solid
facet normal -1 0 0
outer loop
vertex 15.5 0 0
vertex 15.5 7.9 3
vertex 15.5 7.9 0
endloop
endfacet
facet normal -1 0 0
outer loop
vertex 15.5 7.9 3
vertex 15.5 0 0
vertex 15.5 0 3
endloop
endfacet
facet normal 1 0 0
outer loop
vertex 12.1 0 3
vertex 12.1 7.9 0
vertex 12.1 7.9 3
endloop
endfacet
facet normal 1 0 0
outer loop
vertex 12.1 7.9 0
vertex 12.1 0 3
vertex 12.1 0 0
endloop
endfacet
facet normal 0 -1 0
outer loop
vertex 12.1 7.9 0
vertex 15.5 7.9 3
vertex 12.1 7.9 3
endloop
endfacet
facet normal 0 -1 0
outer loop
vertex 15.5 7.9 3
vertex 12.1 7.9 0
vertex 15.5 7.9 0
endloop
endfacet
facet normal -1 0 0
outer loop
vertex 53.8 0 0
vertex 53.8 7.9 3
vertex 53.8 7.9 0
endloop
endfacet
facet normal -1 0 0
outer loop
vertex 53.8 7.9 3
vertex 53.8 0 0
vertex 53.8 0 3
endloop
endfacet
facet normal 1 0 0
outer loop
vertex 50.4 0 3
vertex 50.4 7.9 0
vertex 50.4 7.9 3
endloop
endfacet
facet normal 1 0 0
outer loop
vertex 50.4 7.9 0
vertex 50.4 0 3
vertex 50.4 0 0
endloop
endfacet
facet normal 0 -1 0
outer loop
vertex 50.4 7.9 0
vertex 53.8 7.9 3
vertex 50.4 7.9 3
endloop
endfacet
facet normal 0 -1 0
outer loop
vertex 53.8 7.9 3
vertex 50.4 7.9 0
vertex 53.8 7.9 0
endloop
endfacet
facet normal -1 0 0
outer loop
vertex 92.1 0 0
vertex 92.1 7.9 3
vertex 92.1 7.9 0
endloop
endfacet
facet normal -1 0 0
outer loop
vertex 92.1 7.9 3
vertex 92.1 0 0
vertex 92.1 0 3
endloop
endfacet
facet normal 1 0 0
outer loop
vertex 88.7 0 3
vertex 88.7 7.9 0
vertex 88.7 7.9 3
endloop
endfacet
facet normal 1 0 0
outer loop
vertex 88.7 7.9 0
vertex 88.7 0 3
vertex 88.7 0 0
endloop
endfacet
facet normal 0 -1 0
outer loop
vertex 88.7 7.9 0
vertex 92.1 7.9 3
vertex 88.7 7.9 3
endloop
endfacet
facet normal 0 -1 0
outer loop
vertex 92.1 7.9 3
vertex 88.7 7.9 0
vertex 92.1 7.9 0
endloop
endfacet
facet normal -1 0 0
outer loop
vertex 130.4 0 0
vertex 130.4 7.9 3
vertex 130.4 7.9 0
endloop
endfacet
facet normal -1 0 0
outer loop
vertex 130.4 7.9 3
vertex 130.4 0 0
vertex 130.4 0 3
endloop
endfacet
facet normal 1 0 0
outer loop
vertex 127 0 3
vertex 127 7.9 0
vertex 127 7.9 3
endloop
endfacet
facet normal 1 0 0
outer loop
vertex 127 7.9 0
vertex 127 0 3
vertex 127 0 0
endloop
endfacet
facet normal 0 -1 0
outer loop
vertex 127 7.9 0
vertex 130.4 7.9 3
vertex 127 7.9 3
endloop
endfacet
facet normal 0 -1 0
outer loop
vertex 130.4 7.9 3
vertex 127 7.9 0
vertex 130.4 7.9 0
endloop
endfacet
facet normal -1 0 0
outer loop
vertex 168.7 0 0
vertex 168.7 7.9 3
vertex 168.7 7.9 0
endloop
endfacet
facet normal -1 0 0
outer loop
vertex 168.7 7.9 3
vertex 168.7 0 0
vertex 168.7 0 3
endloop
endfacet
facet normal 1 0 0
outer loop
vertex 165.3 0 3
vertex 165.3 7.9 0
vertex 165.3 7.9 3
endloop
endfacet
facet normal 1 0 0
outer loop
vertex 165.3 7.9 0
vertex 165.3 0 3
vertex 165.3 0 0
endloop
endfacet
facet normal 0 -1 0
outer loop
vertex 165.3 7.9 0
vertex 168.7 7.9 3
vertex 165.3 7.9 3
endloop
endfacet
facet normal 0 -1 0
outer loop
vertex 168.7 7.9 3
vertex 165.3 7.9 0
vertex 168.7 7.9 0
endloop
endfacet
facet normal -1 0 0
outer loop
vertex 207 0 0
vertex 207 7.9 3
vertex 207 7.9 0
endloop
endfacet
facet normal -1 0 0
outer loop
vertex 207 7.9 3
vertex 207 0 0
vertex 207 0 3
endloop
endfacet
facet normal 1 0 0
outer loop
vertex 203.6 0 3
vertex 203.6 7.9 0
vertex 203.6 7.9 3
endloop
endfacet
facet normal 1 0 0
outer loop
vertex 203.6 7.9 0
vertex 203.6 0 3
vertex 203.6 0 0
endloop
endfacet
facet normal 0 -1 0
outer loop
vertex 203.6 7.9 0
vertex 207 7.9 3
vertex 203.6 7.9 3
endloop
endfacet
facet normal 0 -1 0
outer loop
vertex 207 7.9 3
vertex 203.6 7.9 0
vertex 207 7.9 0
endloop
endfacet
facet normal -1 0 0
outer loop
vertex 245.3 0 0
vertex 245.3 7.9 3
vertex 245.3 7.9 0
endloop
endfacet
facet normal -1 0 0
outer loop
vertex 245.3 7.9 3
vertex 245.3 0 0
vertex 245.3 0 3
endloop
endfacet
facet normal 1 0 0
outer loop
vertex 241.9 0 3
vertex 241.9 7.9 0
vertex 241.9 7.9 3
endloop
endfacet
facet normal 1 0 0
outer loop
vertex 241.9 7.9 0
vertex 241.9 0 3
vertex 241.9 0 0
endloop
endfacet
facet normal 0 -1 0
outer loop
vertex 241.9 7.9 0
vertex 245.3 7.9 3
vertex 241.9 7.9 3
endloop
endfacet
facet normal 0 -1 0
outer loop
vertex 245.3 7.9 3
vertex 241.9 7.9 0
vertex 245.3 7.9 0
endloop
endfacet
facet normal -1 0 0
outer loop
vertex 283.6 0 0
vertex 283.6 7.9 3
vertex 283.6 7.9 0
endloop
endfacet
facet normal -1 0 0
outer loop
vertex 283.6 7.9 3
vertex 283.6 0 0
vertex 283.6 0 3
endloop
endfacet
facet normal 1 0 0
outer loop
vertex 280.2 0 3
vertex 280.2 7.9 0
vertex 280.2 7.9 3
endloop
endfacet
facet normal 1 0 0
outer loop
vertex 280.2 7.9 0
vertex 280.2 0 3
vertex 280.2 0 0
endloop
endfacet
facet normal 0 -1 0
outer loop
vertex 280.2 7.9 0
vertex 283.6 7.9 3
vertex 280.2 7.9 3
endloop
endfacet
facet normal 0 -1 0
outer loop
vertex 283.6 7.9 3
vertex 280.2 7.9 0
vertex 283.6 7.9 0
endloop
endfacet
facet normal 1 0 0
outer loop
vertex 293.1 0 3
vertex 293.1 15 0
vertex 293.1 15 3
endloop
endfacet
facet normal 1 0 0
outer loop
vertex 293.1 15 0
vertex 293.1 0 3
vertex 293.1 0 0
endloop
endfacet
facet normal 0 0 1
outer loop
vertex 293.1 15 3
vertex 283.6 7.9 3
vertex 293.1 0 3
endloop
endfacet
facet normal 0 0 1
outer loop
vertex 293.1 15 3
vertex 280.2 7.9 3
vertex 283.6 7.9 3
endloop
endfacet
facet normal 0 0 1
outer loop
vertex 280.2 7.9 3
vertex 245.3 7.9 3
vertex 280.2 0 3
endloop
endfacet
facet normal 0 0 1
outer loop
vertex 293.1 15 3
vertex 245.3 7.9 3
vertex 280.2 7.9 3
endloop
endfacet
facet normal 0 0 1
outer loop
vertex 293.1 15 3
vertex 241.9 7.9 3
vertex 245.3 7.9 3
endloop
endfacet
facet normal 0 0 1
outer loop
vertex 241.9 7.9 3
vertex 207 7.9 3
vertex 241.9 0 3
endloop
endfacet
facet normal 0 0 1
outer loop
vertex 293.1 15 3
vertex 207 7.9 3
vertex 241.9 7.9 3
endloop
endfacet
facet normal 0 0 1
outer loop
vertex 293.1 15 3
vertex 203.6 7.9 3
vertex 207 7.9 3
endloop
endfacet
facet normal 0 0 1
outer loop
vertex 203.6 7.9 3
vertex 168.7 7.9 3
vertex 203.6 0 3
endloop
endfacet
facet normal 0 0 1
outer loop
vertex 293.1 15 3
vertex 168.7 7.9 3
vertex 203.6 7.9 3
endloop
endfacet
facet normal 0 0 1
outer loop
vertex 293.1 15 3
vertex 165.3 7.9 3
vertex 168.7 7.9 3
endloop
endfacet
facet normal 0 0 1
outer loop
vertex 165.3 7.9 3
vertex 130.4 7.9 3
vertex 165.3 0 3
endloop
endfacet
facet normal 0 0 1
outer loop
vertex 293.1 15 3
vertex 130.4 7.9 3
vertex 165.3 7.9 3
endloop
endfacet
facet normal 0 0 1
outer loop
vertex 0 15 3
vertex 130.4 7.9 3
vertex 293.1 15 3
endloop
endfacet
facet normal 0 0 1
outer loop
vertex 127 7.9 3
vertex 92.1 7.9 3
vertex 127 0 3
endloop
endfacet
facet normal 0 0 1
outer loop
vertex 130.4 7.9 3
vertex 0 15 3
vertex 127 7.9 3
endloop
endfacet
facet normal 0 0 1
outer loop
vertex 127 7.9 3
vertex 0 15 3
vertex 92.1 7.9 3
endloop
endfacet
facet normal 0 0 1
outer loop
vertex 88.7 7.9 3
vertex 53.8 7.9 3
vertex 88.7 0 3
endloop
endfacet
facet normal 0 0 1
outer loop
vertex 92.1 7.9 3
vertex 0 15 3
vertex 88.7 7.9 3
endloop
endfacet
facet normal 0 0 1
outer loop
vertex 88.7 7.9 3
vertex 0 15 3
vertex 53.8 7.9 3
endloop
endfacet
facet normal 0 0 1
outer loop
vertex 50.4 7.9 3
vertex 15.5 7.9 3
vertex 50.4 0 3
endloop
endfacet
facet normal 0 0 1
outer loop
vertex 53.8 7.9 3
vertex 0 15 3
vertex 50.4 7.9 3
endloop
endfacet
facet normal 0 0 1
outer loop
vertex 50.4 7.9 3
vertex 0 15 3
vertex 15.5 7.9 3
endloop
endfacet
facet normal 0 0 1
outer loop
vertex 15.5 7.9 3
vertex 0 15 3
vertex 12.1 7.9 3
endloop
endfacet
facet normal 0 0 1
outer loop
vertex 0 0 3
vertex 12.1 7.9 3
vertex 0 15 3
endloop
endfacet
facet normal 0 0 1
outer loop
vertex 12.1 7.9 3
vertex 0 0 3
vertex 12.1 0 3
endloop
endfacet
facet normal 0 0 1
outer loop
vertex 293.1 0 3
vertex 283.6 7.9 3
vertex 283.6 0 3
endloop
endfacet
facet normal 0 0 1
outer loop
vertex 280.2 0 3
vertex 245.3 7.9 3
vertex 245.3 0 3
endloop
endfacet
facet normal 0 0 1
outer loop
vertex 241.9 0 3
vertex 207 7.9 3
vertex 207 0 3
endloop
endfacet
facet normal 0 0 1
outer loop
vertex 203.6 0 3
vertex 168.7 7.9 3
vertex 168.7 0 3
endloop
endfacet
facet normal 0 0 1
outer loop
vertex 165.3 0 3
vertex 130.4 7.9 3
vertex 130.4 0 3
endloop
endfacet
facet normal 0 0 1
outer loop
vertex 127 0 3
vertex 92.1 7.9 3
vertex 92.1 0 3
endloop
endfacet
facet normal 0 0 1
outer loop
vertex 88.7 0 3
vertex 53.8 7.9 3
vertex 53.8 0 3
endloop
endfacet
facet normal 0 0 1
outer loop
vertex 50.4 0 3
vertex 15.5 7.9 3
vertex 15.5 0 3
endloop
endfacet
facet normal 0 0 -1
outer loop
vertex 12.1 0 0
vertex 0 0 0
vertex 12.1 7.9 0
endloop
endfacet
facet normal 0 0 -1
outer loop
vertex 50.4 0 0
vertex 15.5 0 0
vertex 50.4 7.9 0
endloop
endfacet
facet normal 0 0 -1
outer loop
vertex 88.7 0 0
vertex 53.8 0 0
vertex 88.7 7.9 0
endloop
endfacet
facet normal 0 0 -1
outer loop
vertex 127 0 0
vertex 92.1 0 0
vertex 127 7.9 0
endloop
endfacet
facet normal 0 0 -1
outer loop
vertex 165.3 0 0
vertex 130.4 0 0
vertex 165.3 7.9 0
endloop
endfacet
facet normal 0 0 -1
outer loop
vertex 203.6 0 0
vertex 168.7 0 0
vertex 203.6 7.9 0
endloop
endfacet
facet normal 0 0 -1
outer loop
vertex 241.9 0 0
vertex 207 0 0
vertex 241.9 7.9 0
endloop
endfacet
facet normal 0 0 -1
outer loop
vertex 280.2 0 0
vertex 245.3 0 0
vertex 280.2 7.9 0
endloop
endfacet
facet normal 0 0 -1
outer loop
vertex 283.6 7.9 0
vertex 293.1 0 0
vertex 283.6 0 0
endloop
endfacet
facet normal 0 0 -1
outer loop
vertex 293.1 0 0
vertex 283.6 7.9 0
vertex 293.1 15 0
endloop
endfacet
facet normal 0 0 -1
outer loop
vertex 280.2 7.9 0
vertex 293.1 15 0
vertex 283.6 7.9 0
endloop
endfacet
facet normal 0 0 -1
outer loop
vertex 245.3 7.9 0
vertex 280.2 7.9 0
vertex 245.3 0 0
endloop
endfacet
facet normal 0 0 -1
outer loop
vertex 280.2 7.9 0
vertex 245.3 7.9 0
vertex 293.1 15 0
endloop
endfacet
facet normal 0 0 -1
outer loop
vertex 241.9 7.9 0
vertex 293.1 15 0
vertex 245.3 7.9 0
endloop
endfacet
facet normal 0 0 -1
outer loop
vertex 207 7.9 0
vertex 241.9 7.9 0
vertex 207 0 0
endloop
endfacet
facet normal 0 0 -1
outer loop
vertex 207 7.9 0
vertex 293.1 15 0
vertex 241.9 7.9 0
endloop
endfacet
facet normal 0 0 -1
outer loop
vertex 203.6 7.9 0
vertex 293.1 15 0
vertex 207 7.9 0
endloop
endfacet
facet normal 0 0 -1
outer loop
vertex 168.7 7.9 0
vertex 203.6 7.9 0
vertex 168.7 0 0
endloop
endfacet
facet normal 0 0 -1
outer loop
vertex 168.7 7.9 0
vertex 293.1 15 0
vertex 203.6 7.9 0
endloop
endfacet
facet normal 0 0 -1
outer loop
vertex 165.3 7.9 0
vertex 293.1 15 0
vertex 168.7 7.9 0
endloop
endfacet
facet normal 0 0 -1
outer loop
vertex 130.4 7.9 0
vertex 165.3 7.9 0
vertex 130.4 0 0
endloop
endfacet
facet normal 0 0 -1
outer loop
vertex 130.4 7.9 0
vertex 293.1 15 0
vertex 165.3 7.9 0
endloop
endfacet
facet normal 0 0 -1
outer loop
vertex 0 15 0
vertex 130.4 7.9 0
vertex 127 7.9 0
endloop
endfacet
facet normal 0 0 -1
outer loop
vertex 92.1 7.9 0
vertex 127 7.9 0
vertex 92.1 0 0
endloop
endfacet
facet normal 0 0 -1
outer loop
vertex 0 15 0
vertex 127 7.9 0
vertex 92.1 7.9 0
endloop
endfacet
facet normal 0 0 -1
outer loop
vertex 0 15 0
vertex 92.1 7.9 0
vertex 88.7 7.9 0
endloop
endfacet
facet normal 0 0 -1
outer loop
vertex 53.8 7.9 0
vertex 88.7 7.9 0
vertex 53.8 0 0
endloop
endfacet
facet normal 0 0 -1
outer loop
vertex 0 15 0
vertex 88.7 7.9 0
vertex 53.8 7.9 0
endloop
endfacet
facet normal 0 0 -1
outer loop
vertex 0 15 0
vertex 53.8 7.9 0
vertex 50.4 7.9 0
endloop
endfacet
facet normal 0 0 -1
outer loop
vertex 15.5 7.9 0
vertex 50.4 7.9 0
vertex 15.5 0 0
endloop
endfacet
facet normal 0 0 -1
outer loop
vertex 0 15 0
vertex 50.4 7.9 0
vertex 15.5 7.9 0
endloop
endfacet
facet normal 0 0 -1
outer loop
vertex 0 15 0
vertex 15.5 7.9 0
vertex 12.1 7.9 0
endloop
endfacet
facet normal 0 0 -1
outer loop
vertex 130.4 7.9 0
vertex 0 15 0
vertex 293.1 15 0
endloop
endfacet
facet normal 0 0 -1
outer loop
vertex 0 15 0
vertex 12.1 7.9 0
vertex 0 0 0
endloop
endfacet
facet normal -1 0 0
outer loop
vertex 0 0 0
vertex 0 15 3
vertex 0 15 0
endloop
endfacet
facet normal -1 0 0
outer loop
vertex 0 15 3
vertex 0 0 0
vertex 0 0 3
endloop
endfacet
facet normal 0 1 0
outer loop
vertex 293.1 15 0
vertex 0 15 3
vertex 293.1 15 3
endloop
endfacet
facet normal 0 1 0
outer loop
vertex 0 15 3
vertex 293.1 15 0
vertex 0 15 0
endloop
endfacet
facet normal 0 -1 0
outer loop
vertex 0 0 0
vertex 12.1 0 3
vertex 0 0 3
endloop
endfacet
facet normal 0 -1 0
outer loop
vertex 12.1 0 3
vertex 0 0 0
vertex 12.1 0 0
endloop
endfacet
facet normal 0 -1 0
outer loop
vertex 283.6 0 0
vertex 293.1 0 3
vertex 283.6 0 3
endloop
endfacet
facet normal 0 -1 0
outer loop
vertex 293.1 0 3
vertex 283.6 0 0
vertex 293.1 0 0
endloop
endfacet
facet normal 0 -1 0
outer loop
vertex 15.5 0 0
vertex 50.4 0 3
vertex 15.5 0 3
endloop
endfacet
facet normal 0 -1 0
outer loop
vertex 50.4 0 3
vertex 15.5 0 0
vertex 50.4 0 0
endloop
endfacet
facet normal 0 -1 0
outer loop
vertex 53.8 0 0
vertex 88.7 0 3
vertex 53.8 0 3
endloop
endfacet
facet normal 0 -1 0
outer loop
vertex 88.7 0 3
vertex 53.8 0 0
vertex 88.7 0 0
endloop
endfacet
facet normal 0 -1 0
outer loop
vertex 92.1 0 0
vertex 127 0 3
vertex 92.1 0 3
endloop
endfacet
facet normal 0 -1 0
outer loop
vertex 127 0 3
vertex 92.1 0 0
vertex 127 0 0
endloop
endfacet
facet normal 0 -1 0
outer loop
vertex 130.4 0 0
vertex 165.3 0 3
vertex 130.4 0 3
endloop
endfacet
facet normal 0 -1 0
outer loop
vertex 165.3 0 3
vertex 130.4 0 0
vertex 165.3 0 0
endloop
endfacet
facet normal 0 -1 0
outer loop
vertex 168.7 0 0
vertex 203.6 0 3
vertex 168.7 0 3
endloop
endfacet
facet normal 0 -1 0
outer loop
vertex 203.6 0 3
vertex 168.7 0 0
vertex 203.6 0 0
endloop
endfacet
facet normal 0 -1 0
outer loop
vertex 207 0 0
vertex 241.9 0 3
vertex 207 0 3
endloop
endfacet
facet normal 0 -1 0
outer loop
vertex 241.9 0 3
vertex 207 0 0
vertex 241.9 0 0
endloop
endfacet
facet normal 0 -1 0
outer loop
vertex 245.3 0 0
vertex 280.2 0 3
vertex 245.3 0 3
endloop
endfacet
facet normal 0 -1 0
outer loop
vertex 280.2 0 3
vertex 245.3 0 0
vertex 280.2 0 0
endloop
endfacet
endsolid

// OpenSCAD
// file: parametre.scad
/* pour le rendu openscad */

// pour la finesse de rendu
// plus c'est élevé, mieux c'est... mais ça prend plus de temps et de ressource
resolution = 10;

// pour export DXF
show_mode_projection = 0;

// pour enlever de la matière des objets dans openscad et être certain qu'il ne reste pas un bout de face
difference_objet_marge = 20;

// pour afficher (1) ou pas (0) les accessoires installés
show_accessoires = 1;

show_incrustations = 0;

show_logo_r2builders = 0;



/* pour le design du jeu  */

// tout est en millimetre !!!!

// configuration globale
////////////////////////

// quand on perce et que l'on va insérer quelque chose dedans...
// il faut un peu de vide en plus ;)
padding_percage = 0.2;

// espace supplémentaire pour la largeur de rainure
padding_rainure = 0; // 1

// profondeur standard pour une rainure
profondeur_rainure = 0; // 2 // moins que epaisseur_tole_grille_led et que epaisseur_tole_grille_led ! Il faut qu'il reste de la matière !

// définition de base du jeu
nombre_colonnes = 7;
nombre_lignes = 6;


// les boutons de sélection de colonne et du nombre de joueurs
//////////////////////////////////////////////////////////////
diametre_bouton_arcade = 33.3;
rayon_bouton_arcade = diametre_bouton_arcade / 2;
diametre_trou_bouton_arcade = 27.8;
rayon_trou_bouton_arcade = diametre_trou_bouton_arcade / 2;
hauteur_bague_bouton_arcade = 4.7;
hauteur_bouton_arcade = 4.85;
diametre_push_bouton_arcade = diametre_bouton_arcade - 4;
profondeur_interne_bouton_arcade = 33.5;


// bouton EC11
//////////////
diametre_bouton_ec11 = 14.4;
hauteur_bouton_ec11 = 13.1;
epaisseur_trait_ec11 = 1;
trou_axe_ec11 = 7;
espace_platine_bouton = 10.7;
hauteur_platine_ec11 = 33.4;
largeur_platine_ec11 = 27.5;
epaisseur_platine_ec11 = 1.3;
trou_fixation_ec11 = 3;
trou_marge_ec11 = 2.40;


// haut-parleur HP8R
////////////////////
HP8R_epaisseur_totale = 16.25;
HP8R_largeur = 36.24;
HP8R_hauteur = 75;
HP8R_epaisseur_tole = 1.63;
HP8R_hauteur_caisson = 71;
//HP8R_epaisseur_caisson = 16.25 - HP8R_epaisseur_tole;
HP8R_decalage_hauteur_trou = 12.3;
HP8R_largeur_trou = 27.1;
HP8R_hauteur_trou = 38.3;
HP8R_epaisseur_trou = HP8R_epaisseur_totale - 2;
HP8R_diametre_creuse_coins = 10;
HP8R_diametre_creuse_fixation = 3;
HP8R_marge_creuse_fixation = 1.6 + padding_percage;


// Embase alimentation
//////////////////////
embase_decallage = 3.3;
embase_externe_largeur = 8.95;
embase_externe_hauteur = 10.7;
embase_externe_profondeur = 3.5;
embase_externe_marge_trou = 3.3;
embase_externe_diametre_trou = 6.4;
embase_externe_diametre_pin = 1.6;
embase_interne_profondeur = 10.6;
embase_platine_profondeur = 25.5;
embase_platine_decallage = 5.6;
embase_platine_largeur = 25.9;
embase_platine_epaisseur = 1.6;
embase_marge_fixation = 1.5;
embase_diametre_fixation = 3;


// led type1 : LED étanche avec électronique carré
////////////
profondeur_chapeau_led = 7.5;
diametre_trou_led = 9;
diametre_interne_led = 9;
profondeur_interne_led = 0;
boitier_largeur_led = 17.2;
boitier_hauteur_led = 11.2;
boitier_epaisseur_led = 5;


// pour stocker les cables et l'électronique
////////////////////////////////////////////
espace_vide_milieu = 40; // TODO: à valider !   vérifier qu'il n'y a pas de conflit entre bouton et led en haut !!!


// le mur Star Wars fenetré
///////////////////////////
epaisseur_tole_mur = 4;
taille_fenetre = diametre_bouton_arcade; // valeur à fixer si bouton plus petit, ici je m'adapte à cette taille de bouton
ecart_entre_fenetre = 5; // au jugé ;)
marge_mur = 15; // pour aérer le tour   10 => haut parleur touche led et conflit bouton dans le coin !


// cadrillage autour des LEDs
/////////////////////////////
profondeur_separateur_led = 15; // TODO: à valider !
epaisseur_separateur_led = 3;
decallage_separateur_led = (ecart_entre_fenetre - epaisseur_separateur_led) / 2;


// on peut maintenant calculer la surface du jeu !
largeur_mur = marge_mur + (nombre_colonnes * taille_fenetre) + ((nombre_colonnes - 1) * ecart_entre_fenetre) + marge_mur;
hauteur_mur = marge_mur + (nombre_lignes * taille_fenetre) + ((nombre_lignes - 1) * ecart_entre_fenetre) + marge_mur;
echo(str("** PLAQUE MUR (x2) : ", largeur_mur , " x ", hauteur_mur, " x ", epaisseur_tole_mur));


// la grille de LEDS
////////////////////
epaisseur_tole_grille_led = 4;
largeur_rainure_grille_led = epaisseur_tole_grille_led + padding_rainure;
profondeur_rainure_grille_led = profondeur_rainure; // moins que epaisseur_tole_grille_led !!!
echo(str("** PLAQUE GRILLE LED (x2) : ", largeur_mur , " x ", hauteur_mur, " x ", epaisseur_tole_grille_led));


// le plexi blanc derrière le mur, pour faire les fenêtres
//////////////////////////////////////////////////////////
epaisseur_plexi_blanc = 2.5;
transparence_plexi = 1;
echo(str("** PLAQUE PLEXI BLANC (x2) : ", largeur_mur , " x ", hauteur_mur, " x ", epaisseur_plexi_blanc));


// calcul de l'épaisseur complète du jeu
epaisseur_jeu = espace_vide_milieu + 2 * epaisseur_tole_mur + 2 * epaisseur_plexi_blanc + 2 * epaisseur_tole_grille_led + 2 * profondeur_separateur_led;


// la plaque du dessus avec les boutons de choix de colonne
///////////////////////////////////////////////////////////
epaisseur_tole_dessus = 4; // ce "chapeau" sera rainurée pour tenir les plaques !
debord_rainure = 5; // qui dépasse de devant et derrière 
profondeur_dessus = epaisseur_jeu + 2 * debord_rainure;
marge_largeur_dessus = (largeur_mur - (nombre_colonnes * diametre_bouton_arcade) - ((nombre_colonnes - 1) * ecart_entre_fenetre)) / 2;
largeur_rainure_mur_plexi = epaisseur_tole_mur + epaisseur_plexi_blanc + padding_rainure;
profondeur_rainure_mur_plexi = profondeur_rainure; // moins que epaisseur_tole_dessus !!!
echo(str("** PLAQUE DESSUS : ", largeur_mur , " x ", profondeur_dessus, " x ", epaisseur_tole_dessus));


// la plaque de dessous
///////////////////////
epaisseur_tole_dessous = 4; // ce socle sera rainurée pour tenir les plaques !
dessous_debord_rainure = 50;
profondeur_dessous = epaisseur_jeu + 2 * dessous_debord_rainure;
echo(str("** PLAQUE SOCLE : ", largeur_mur , " x ", profondeur_dessous, " x ", epaisseur_tole_dessous));


hauteur_cote = epaisseur_tole_dessous + hauteur_mur + epaisseur_tole_dessus - 2 * profondeur_rainure_grille_led;
largeur_cote = profondeur_dessus;


// côté gauche
//////////////
epaisseur_tole_gauche = 4;
echo(str("** PLAQUE COTE GAUCHE : ", largeur_cote , " x ", hauteur_cote, " x ", epaisseur_tole_gauche));


// côté droit
/////////////
epaisseur_tole_droit = 4;
position_ec11 = epaisseur_tole_dessous + embase_platine_epaisseur + embase_externe_hauteur + 15 + hauteur_platine_ec11 / 2; // 15 = taille d'une pinouille arduino connectée sur l'embase
echo(str("** PLAQUE COTE DROIT : ", largeur_cote , " x ", hauteur_cote, " x ", epaisseur_tole_droit));

position_haut_parleur_HP8R = position_ec11 + hauteur_platine_ec11 / 2 + 5;
// main file
include <parametre.scad>

// pour exporter en .dxf
if(show_mode_projection == 1)
	projection(cut = false) spacerHorizontal();

if(show_mode_projection == 0)
	spacerHorizontal();

module spacerHorizontal() {
    color([1, 1, 1]) {
        difference() {
            cube(size=[largeur_mur, profondeur_separateur_led, epaisseur_separateur_led]);

            for(colonne = [1 : nombre_colonnes + 1]) {
                translate([marge_mur + (colonne - 1) * (taille_fenetre + ecart_entre_fenetre) - (ecart_entre_fenetre / 2) - 2 * padding_percage, 
                        -difference_objet_marge + padding_percage, 
                        -padding_percage])
                    cube(size=[epaisseur_separateur_led + 2 * padding_percage, 
                    profondeur_separateur_led / 2 + padding_percage + difference_objet_marge, 
                    epaisseur_separateur_led + 2 * padding_percage]);
            }
        }
    }
}

module spacerVertical() {
    color([1, 1, 1]) {
        translate([-profondeur_separateur_led, 0, padding_percage - decallage_separateur_led])
        difference() {
            cube(size=[profondeur_separateur_led, hauteur_mur, epaisseur_separateur_led]);

            for(ligne = [1 : nombre_lignes + 1]) {
                translate([-difference_objet_marge, 
                marge_mur + (ligne - 1) * (taille_fenetre + ecart_entre_fenetre) - ecart_entre_fenetre / 2 - 3 * padding_percage, 
                -padding_percage])
                    cube(size=[profondeur_separateur_led / 2 - padding_percage + difference_objet_marge, 
                    epaisseur_separateur_led + 2 * padding_percage, 
                    epaisseur_separateur_led + 2 * padding_percage]);
            }
        }
    }
}
